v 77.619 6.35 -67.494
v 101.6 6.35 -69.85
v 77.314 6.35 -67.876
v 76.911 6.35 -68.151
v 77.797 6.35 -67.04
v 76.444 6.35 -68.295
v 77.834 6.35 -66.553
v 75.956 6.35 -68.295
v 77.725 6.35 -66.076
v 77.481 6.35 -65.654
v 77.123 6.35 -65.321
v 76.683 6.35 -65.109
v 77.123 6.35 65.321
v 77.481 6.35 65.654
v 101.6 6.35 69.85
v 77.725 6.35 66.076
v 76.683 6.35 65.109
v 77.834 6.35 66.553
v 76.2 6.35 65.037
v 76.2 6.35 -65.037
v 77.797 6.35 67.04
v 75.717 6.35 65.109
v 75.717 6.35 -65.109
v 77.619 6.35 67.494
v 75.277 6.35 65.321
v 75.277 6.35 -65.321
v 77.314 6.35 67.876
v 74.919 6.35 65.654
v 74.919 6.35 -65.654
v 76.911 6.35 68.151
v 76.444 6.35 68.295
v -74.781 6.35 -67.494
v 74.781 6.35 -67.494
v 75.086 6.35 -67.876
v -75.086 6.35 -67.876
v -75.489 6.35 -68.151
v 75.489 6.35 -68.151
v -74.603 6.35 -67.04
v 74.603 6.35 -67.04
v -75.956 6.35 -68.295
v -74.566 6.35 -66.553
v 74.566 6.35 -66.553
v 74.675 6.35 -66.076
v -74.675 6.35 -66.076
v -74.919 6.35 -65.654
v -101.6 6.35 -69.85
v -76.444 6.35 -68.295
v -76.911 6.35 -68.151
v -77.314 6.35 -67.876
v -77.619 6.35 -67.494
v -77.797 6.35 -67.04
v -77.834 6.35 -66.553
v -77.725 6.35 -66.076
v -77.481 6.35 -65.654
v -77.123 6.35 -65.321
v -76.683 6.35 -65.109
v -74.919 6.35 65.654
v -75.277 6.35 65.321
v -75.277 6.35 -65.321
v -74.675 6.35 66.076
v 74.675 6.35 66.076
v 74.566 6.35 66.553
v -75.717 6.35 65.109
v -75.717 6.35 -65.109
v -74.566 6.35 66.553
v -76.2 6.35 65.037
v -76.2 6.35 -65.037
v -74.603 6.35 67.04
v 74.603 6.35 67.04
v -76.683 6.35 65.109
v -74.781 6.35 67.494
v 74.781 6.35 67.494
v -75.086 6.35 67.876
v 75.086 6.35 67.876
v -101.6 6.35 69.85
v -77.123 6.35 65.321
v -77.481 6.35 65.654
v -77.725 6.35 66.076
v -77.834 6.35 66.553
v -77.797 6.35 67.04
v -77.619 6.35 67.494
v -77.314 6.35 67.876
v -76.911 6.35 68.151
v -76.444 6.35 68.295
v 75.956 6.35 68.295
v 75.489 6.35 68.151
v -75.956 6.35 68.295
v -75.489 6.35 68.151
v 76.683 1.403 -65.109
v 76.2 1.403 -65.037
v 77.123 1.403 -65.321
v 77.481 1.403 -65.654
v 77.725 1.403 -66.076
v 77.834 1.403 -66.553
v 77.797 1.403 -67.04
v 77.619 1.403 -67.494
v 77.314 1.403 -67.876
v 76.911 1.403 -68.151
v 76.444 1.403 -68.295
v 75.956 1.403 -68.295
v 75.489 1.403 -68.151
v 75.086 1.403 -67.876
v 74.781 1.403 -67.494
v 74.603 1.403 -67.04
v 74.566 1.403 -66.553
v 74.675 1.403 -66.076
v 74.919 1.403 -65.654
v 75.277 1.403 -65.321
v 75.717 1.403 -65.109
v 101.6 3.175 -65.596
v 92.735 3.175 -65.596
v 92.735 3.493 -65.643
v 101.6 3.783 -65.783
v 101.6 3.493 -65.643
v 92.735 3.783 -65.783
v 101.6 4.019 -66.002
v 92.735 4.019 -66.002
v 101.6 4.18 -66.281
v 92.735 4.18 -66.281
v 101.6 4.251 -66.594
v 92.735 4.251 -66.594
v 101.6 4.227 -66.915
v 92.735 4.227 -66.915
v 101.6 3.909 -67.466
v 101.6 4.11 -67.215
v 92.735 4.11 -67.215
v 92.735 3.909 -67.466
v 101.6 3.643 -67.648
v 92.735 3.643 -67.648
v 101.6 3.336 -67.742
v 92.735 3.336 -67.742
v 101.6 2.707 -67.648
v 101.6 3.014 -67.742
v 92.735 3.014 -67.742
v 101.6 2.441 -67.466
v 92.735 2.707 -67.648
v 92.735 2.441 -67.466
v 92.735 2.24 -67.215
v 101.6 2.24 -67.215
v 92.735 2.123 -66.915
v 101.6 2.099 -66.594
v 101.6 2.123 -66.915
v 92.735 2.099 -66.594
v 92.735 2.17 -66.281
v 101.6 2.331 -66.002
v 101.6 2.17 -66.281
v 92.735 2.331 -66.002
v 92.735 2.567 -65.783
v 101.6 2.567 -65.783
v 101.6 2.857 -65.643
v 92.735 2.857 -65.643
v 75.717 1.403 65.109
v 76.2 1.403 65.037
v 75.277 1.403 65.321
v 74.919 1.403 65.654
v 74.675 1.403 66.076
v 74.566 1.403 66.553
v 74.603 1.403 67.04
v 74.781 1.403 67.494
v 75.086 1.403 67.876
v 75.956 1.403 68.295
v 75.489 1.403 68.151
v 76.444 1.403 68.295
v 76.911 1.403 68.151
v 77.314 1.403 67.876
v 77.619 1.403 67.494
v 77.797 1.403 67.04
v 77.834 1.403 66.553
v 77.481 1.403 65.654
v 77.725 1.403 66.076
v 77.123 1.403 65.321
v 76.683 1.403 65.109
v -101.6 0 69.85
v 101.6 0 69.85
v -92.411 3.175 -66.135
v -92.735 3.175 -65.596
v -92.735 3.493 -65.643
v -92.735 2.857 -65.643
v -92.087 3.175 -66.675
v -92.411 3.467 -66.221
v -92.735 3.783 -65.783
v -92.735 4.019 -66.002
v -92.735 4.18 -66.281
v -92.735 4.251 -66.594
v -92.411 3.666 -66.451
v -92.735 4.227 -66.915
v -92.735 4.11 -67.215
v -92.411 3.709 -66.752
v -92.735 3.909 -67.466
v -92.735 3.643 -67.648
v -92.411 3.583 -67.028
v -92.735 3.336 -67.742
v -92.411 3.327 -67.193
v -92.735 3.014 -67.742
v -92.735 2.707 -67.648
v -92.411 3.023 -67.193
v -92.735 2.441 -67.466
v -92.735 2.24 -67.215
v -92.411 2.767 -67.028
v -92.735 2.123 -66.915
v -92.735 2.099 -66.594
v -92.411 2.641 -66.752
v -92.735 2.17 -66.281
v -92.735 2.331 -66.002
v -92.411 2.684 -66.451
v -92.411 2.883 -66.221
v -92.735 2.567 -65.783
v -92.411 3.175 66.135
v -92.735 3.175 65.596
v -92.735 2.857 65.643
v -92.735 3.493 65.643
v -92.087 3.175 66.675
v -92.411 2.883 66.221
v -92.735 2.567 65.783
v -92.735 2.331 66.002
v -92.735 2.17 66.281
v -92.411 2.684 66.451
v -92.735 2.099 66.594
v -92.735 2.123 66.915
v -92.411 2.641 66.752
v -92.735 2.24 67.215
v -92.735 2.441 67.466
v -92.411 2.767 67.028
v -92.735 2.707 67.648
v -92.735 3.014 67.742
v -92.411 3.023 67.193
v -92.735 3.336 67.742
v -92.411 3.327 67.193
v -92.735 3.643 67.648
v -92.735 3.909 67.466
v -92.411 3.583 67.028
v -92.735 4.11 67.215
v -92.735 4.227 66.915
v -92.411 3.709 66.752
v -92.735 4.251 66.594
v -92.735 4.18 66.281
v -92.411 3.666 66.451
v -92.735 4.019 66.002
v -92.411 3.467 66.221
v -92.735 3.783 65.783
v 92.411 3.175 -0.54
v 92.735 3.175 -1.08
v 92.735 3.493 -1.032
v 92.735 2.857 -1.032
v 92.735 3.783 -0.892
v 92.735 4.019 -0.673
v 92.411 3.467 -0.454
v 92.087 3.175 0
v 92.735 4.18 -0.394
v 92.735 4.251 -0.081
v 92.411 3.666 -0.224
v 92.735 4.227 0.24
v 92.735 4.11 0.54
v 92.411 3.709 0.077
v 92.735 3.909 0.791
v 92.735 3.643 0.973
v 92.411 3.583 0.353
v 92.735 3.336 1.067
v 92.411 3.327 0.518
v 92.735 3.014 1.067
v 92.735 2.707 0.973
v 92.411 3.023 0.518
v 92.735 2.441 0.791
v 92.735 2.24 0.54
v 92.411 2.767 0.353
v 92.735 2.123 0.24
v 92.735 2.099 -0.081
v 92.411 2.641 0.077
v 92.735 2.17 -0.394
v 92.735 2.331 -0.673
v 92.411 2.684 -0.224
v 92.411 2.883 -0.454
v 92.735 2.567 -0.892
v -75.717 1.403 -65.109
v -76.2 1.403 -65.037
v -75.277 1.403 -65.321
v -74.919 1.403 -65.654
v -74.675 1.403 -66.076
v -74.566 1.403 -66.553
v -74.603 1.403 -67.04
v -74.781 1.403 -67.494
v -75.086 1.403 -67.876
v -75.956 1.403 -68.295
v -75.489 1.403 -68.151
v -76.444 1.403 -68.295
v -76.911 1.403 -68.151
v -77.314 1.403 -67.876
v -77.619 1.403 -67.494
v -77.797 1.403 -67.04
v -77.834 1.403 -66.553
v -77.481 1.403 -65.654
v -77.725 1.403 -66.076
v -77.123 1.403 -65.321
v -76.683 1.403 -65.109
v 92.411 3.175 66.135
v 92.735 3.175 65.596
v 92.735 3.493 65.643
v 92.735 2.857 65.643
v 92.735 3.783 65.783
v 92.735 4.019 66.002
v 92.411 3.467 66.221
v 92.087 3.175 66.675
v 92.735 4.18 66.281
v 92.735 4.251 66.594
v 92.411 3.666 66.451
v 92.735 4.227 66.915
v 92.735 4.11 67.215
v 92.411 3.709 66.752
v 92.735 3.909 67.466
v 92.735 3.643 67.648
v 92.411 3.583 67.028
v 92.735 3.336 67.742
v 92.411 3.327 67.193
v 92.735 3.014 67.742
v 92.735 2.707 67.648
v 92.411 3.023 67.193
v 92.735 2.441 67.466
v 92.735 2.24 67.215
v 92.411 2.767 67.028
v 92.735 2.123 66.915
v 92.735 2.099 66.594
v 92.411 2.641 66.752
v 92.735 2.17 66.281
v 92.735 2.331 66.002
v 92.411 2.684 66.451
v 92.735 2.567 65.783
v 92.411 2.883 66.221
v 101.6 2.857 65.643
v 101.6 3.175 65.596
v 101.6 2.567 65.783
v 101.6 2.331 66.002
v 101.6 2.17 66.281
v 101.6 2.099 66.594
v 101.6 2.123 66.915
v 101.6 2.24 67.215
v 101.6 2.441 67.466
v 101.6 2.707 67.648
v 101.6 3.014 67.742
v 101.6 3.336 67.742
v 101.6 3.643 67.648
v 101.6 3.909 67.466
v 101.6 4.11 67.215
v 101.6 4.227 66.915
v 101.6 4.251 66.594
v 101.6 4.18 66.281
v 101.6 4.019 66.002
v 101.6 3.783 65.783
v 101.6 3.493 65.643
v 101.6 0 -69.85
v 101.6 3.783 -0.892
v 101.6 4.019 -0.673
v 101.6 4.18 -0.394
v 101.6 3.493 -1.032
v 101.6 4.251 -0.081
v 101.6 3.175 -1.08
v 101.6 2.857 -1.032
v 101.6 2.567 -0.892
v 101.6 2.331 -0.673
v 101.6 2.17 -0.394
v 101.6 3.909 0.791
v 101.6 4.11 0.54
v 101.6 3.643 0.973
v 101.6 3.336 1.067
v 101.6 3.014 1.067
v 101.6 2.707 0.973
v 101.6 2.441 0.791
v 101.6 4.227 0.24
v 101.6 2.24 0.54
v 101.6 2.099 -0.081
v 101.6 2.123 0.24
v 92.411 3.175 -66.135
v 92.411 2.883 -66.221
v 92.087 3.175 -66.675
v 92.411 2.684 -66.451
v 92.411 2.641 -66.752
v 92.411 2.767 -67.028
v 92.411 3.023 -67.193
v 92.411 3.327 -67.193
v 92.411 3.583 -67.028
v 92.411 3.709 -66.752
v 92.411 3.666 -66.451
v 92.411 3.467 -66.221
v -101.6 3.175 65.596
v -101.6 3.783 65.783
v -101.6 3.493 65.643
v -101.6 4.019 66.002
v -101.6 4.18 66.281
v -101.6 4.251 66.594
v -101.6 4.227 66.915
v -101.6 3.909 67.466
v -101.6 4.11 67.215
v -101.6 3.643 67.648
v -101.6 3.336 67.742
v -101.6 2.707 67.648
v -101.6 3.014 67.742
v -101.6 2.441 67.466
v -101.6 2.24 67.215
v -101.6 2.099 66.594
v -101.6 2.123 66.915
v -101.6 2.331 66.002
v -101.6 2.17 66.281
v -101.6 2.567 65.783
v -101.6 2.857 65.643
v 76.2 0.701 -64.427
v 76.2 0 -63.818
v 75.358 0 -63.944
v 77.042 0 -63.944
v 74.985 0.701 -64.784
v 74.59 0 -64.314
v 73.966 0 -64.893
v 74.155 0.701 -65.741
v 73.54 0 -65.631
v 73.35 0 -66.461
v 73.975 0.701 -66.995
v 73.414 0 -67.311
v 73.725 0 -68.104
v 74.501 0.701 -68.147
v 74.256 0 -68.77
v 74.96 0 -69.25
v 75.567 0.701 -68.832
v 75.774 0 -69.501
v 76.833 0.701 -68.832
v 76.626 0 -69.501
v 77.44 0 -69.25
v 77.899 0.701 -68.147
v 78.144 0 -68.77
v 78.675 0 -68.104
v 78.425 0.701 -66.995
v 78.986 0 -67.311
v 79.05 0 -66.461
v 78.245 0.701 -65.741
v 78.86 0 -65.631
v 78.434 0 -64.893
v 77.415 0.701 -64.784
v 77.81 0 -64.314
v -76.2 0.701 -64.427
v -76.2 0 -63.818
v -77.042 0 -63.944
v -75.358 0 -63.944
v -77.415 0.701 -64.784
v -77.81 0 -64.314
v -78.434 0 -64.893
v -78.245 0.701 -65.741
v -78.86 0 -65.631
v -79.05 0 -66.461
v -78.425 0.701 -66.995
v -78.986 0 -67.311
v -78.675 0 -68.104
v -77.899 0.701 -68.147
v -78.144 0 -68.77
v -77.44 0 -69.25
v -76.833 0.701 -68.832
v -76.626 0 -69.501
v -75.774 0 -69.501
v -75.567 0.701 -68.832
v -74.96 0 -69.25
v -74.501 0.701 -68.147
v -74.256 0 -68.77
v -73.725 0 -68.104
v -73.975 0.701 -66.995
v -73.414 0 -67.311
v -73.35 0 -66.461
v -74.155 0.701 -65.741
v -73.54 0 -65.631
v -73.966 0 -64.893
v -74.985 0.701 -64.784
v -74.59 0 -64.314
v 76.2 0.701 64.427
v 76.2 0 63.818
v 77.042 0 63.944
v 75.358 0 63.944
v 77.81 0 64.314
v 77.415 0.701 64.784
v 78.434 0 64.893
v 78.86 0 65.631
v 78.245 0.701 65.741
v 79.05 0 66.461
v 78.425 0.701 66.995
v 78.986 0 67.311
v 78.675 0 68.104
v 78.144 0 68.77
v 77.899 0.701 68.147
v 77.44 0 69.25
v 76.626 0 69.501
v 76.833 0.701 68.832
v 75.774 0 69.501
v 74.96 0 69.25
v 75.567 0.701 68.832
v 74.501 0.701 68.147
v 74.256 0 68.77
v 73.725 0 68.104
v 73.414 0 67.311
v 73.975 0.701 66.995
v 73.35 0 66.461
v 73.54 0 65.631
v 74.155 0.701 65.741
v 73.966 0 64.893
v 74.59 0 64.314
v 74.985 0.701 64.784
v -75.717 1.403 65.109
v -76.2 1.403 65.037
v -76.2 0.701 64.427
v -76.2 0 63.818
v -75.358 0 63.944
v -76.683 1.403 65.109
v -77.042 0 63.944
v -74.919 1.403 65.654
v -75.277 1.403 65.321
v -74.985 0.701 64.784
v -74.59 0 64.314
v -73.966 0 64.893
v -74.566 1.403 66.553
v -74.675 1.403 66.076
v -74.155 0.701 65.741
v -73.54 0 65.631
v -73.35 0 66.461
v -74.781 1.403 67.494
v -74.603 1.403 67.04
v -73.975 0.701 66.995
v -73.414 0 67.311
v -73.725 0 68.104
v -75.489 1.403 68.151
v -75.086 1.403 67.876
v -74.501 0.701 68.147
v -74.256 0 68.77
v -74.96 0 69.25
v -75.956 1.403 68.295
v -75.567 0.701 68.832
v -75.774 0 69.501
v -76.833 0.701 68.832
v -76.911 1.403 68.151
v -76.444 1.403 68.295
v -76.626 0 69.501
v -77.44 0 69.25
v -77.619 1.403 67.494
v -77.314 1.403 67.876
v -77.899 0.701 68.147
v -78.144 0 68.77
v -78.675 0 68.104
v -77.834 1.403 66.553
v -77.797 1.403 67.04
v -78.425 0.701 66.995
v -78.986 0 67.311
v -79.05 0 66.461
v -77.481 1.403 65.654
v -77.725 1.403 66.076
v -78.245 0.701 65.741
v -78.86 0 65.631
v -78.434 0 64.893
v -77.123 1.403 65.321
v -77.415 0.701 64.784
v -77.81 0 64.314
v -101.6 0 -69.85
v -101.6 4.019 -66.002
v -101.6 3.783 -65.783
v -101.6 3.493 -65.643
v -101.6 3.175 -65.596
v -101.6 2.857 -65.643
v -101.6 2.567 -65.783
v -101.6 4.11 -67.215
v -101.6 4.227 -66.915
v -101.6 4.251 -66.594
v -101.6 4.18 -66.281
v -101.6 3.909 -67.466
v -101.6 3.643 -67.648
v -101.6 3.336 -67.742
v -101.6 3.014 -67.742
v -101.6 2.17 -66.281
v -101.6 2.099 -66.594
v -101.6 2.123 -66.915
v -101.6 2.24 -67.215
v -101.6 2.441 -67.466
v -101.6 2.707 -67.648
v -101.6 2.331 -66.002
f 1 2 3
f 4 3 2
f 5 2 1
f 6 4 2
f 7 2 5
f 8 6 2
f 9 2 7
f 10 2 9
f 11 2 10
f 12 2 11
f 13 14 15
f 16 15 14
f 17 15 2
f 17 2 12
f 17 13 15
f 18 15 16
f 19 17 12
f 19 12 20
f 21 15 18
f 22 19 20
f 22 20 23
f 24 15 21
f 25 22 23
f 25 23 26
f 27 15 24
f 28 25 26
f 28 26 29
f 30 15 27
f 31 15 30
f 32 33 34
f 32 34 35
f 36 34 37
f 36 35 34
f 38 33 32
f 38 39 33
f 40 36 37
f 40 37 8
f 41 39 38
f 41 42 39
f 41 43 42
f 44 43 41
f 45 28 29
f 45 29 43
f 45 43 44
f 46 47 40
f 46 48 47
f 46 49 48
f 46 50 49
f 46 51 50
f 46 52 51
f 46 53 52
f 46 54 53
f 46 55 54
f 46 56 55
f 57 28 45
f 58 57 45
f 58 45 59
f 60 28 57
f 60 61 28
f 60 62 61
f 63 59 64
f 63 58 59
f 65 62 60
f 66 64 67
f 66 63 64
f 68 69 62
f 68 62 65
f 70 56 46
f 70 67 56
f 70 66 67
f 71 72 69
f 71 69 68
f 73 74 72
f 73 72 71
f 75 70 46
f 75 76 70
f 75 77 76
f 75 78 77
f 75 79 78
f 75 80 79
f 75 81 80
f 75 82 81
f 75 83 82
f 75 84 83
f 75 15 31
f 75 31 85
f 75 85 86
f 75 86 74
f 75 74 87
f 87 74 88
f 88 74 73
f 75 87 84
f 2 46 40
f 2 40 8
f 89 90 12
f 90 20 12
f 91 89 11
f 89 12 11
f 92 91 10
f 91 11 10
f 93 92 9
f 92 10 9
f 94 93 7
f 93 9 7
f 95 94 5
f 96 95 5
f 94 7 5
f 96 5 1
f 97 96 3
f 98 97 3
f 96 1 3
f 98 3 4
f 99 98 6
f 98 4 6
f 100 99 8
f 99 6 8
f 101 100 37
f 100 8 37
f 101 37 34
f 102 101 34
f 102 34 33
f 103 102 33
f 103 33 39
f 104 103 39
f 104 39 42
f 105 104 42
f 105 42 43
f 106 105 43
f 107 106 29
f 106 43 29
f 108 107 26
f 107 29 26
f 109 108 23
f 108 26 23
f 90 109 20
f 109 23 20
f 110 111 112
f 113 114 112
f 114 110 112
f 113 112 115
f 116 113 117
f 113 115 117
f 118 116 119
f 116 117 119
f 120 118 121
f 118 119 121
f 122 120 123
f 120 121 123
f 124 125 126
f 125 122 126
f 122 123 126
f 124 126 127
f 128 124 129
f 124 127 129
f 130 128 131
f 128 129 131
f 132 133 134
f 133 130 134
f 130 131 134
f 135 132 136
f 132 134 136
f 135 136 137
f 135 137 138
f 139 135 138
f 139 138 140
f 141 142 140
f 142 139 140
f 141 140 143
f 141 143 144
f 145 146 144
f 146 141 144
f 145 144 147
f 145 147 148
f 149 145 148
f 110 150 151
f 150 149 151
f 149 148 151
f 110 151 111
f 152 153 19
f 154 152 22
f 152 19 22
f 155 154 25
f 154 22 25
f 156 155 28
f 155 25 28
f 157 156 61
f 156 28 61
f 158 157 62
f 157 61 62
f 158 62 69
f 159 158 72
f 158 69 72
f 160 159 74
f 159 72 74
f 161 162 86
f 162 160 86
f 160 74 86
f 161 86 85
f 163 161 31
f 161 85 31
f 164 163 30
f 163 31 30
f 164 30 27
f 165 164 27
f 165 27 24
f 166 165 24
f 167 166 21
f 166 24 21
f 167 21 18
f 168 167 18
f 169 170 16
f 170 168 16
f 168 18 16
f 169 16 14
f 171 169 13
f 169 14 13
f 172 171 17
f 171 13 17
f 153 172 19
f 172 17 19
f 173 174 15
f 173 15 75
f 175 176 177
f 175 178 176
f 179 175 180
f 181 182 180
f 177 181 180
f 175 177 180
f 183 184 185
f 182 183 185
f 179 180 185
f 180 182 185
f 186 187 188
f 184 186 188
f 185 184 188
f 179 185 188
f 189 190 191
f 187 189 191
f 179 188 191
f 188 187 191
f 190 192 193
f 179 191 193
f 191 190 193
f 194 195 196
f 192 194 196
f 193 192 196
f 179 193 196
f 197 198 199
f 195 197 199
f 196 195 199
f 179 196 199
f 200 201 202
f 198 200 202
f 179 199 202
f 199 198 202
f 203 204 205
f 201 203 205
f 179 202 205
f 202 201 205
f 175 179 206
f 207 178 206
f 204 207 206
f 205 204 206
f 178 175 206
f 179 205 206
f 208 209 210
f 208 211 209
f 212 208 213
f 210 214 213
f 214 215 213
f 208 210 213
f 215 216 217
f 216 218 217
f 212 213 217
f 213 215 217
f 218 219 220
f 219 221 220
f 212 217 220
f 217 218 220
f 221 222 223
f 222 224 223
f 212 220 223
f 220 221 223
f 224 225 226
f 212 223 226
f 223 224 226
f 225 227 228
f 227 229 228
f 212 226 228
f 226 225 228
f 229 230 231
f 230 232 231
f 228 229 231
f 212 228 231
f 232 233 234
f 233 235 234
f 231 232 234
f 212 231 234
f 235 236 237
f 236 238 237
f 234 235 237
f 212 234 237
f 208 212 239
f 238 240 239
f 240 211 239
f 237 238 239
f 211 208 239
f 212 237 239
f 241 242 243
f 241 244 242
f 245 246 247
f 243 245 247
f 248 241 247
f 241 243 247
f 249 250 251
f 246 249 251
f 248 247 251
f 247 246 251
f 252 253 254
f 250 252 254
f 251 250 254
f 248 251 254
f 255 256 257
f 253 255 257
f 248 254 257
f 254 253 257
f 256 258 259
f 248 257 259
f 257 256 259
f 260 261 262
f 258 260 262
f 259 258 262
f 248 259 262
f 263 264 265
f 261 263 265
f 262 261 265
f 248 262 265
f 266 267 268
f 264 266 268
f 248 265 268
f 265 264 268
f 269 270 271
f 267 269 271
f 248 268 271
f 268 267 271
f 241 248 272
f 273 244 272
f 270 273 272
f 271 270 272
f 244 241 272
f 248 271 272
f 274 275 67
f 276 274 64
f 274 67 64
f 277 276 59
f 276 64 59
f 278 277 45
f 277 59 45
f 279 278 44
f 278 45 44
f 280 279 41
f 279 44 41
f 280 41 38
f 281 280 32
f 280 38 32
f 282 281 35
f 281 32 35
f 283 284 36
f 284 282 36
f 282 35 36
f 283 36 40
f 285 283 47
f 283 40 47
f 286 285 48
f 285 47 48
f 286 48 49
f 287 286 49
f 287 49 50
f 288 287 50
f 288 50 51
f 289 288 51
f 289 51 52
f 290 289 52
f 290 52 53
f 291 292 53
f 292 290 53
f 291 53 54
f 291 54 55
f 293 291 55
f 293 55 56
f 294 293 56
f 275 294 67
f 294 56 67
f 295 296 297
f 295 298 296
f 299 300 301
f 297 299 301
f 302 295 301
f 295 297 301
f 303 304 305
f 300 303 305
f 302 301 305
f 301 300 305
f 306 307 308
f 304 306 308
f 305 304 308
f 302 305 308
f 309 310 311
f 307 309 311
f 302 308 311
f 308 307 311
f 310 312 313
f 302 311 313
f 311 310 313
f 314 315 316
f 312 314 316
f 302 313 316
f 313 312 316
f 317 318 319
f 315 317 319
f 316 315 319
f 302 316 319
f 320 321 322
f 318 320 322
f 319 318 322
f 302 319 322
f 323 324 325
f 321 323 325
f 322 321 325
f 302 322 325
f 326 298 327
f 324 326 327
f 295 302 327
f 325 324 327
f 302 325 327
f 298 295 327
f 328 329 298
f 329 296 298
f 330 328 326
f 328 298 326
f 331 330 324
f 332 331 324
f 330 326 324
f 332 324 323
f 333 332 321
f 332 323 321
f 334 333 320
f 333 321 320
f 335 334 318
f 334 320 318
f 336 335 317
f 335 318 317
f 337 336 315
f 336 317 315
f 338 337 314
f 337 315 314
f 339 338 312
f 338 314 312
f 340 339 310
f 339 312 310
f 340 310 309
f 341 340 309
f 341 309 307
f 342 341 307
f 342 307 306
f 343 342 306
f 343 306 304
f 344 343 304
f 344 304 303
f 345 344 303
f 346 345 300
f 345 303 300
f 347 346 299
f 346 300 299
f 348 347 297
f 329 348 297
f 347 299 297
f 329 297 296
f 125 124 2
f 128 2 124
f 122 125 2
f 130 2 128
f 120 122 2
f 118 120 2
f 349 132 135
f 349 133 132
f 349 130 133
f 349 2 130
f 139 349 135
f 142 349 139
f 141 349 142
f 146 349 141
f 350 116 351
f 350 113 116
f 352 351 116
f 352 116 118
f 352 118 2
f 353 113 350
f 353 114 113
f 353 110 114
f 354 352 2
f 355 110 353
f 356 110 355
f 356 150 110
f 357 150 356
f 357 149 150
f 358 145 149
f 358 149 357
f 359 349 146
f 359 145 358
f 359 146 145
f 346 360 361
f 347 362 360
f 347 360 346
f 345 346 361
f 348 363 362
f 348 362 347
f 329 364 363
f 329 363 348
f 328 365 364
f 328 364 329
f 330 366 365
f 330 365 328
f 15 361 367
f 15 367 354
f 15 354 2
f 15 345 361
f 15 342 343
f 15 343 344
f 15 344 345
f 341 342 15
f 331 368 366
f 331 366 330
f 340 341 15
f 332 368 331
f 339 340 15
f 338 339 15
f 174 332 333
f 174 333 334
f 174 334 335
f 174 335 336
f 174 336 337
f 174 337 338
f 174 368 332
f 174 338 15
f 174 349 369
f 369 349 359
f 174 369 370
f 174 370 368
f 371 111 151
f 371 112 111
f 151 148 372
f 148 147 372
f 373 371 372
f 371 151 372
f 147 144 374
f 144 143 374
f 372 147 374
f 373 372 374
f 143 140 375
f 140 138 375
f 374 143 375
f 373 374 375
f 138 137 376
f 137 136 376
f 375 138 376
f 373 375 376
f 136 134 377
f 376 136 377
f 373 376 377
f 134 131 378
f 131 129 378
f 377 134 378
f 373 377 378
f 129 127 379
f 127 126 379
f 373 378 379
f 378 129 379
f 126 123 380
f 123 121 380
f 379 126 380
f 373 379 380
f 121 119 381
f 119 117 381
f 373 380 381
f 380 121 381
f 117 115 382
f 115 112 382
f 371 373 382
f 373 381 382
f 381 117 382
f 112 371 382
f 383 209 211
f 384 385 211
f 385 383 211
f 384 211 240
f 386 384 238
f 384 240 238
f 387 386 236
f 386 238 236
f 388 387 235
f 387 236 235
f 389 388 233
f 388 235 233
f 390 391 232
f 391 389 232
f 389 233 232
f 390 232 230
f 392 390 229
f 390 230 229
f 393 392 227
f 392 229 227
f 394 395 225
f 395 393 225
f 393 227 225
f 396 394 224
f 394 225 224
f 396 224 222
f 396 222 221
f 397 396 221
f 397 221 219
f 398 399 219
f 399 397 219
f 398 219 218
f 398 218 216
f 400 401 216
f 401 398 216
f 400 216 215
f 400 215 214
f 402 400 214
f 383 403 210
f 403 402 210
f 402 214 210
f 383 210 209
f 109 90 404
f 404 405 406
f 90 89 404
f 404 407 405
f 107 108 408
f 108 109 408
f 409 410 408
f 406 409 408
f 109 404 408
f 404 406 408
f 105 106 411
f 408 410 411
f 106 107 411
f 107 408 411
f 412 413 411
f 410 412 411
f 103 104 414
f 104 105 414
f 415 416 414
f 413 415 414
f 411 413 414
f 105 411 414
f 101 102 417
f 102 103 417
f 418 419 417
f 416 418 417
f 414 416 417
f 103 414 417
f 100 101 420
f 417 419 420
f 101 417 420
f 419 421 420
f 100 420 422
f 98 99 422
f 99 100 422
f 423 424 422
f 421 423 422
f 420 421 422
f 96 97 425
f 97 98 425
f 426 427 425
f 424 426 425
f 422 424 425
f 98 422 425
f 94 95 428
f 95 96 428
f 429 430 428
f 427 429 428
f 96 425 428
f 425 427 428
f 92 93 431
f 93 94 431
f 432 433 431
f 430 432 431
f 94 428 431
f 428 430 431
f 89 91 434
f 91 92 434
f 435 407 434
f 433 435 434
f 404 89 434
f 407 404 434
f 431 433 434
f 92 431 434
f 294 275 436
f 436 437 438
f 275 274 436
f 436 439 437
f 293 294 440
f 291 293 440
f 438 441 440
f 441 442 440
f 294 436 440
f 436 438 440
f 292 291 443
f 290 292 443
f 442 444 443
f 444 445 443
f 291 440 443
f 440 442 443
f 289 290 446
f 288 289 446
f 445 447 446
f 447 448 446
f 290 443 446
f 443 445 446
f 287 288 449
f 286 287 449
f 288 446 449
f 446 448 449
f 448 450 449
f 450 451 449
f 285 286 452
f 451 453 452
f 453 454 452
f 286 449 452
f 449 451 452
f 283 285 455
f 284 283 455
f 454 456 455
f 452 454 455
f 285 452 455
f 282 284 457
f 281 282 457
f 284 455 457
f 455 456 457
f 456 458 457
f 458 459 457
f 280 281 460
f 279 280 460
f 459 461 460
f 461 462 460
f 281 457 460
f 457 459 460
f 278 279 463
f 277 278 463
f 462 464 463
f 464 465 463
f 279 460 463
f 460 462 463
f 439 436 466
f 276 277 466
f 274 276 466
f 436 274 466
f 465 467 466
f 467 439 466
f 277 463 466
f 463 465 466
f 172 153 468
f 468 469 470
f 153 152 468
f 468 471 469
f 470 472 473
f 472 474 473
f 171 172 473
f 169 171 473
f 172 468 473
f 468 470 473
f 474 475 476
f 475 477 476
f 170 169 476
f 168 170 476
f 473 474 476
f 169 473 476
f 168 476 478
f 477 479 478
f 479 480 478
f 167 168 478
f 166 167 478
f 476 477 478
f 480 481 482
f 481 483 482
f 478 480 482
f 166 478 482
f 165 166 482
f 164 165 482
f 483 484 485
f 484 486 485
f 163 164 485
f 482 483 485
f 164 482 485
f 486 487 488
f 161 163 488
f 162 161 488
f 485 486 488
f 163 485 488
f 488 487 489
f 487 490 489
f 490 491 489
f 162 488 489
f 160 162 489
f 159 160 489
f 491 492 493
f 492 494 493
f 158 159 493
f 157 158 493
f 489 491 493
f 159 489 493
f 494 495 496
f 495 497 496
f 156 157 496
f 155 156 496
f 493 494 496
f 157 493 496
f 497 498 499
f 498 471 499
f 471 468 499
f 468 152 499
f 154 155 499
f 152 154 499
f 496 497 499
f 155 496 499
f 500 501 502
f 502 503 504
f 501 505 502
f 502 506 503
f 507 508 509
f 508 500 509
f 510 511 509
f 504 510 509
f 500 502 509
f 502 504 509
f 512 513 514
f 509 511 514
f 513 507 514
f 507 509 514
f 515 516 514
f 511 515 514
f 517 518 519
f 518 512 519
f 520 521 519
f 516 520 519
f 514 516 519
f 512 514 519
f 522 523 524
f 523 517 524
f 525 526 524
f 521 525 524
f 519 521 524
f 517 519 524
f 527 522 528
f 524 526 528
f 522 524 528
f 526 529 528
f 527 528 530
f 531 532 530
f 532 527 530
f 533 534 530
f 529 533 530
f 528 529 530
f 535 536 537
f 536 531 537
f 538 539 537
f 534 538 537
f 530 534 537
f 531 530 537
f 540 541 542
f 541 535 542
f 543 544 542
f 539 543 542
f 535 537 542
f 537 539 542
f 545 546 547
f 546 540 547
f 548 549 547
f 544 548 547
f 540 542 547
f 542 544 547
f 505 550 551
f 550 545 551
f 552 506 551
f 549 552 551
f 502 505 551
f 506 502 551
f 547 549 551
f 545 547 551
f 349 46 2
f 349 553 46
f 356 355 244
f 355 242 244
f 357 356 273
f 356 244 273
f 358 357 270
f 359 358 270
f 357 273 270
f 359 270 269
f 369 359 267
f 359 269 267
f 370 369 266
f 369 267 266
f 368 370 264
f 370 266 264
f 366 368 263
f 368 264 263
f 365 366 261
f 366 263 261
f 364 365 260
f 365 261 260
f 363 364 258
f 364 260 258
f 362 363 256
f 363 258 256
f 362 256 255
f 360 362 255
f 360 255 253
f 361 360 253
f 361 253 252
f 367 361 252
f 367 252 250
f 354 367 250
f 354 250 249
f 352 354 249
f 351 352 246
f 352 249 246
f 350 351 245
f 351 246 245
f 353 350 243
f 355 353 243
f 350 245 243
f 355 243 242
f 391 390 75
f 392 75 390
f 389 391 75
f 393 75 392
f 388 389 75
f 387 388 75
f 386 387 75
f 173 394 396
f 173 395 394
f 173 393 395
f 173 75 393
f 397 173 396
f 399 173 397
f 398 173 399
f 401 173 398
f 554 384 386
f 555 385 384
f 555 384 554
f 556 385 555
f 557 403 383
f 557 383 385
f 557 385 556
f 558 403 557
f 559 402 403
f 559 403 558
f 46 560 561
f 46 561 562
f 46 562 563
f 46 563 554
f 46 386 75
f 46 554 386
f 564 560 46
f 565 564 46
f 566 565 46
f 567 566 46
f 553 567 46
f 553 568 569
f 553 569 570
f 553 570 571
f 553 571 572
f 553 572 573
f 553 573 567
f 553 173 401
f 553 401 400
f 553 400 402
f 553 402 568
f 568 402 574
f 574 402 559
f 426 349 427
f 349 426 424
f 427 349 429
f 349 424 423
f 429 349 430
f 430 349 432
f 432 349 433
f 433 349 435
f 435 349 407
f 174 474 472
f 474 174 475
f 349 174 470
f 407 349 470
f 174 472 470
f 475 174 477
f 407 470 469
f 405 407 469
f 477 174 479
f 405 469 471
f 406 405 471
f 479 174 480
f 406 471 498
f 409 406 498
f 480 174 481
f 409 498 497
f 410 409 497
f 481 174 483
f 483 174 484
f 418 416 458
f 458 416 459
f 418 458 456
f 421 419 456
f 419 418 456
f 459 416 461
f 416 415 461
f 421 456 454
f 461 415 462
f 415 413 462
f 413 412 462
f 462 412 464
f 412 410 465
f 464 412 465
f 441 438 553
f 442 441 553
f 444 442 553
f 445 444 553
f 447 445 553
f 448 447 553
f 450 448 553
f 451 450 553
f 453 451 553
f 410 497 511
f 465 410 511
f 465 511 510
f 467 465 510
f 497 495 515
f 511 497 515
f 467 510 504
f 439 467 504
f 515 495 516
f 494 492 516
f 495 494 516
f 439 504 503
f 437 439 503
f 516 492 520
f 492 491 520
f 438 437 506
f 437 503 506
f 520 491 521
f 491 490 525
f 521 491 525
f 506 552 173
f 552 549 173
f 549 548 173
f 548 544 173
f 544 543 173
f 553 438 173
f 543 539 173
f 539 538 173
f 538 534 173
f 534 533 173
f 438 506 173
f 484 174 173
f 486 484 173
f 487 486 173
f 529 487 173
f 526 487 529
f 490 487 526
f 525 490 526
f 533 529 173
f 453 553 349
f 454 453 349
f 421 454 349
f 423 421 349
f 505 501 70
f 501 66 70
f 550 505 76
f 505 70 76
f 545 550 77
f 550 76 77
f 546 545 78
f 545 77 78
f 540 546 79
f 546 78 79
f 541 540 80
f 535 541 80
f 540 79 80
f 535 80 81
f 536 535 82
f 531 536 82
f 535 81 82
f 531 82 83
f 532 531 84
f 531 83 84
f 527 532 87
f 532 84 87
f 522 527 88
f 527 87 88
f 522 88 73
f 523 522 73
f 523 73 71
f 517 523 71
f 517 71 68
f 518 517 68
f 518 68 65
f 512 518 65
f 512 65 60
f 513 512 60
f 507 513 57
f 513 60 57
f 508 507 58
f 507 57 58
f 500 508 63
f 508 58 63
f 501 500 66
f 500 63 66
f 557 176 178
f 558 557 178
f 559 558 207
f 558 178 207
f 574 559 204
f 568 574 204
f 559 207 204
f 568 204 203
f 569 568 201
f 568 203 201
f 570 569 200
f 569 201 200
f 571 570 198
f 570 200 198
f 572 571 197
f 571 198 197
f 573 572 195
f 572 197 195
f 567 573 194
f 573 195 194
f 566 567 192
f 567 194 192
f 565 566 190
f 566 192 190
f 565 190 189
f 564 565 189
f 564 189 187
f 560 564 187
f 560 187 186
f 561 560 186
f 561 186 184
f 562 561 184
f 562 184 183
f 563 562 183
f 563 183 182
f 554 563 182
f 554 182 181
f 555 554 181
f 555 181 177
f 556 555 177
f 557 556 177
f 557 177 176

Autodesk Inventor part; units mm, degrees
ref_plane "YZ Plane" through (0, 0, 0) normal (1, 0, 0) x (0, 1, 0)
ref_plane "XZ Plane" through (0, 0, 0) normal (0, 1, 0) x (-1, 0, 0)
ref_plane "XY Plane" through (0, 0, 0) normal (0, 0, 1) x (1, 0, 0)
sketch "Sketch1" plane through (0, 0, 0) normal (0, 1, 0) x (-1, 0, 0)
  line L0 (-101.6, 69.85) -> (101.6, 69.85)
  line L1 (101.6, 69.85) -> (101.6, -69.85)
  line L2 (101.6, -69.85) -> (-101.6, -69.85)
  line L3 (-101.6, -69.85) -> (-101.6, 69.85)
  line L4 (-101.6, 69.85) -> (101.6, -69.85) construction
  line L5 (101.6, 69.85) -> (-101.6, -69.85) construction
  point P0 (0, 0)
  dimension "d0" = 203.2
  dimension "d1" = 139.7
extrude "Extrusion1" add sketch "Sketch1" along normal blind 6.35
sketch "Sketch9" plane through (101.6, 0, 69.85) normal (1, 0, 0) x (0, 0, -1)
  line L0 (139.7, 0) -> (0, 0) projected
  line L1 (139.7, 0) -> (139.7, 6.35) projected
  line L2 (0, 6.35) -> (139.7, 6.35) projected
  line L3 (0, 0) -> (0, 6.35) projected
  point P0 (69.85, 0)
  point P1 (3.175, 3.175)
  dimension "d45" = 3.175
  dimension "d46" = 3.175
hole "Hole3" at (101.6, 3.175, 66.675) direction (-1, 0, 0) diameter 2.159 depth 8.8646 tip angle 118
mirror "Mirror5" about plane through (0, 0, 0) normal (0, 0, 1) of "Hole3"
mirror "Mirror6" about plane through (0, 0, 0) normal (1, 0, 0) of "Hole3", "Mirror5"
sketch "Sketch11" plane through (0, 0, 0) normal (0, -1, 0) x (1, 0, 0)
  line L0 (101.6, 69.85) -> (-101.6, 69.85) projected
  line L1 (-101.6, 69.85) -> (-101.6, -69.85) projected
  line L2 (-101.6, -69.85) -> (101.6, -69.85) projected
  line L3 (101.6, -69.85) -> (101.6, 69.85) projected
  point P0 (0, 0)
  point P1 (-76.2, 66.675)
  dimension "d61" = 25.4
  dimension "d62" = 3.175
hole "Hole4" at (-76.2, 0, 66.675) direction (0, 1, 0) diameter 3.2766 end through all countersink diameter 5.715 countersink angle 82 clearance for "Flat Head Machine Screw (82)" size "#4" standard "Ansi Unified Screw Threads"
mirror "Mirror7" about plane through (0, 0, 0) normal (1, 0, 0) of "Hole4"
mirror "Mirror8" about plane through (0, 0, 0) normal (0, 0, 1) of "Hole4", "Mirror7"
sketch "Sketch12" plane through (101.6, 0, 69.85) normal (1, 0, 0) x (0, 0, -1)
  circle A0 centre (136.525, 3.175) radius 1.0795 projected
  circle A1 centre (3.175, 3.175) radius 1.0795 projected
  line L0 (139.7, 0) -> (0, 0) projected
  line L1 (139.7, 0) -> (139.7, 6.35) projected
  line L2 (0, 6.35) -> (139.7, 6.35) projected
  line L3 (0, 0) -> (0, 6.35) projected
  point P0 (69.85, 0)
  point P1 (69.85, 3.175)
  dimension "d70" = 3.175
  dimension "d71" = 69.85
hole "Hole5" at (101.6, 3.175, 0) direction (-1, 0, 0) diameter 2.159 depth 8.8646 tip angle 118
equation "\"d0\" = depth"
equation "\"d1\" = height + 2 * plasticThickness"
equation "\"d2\" = caseThickness"
equation "\"d45\" = 0.5 * caseThickness"
equation "\"d46\" = 0.5 * caseThickness"
equation "\"d61\" = 4 * caseThickness"
equation "\"d62\" = 0.5 * caseThickness"
equation "\"d70\" = 0.5 * caseThickness"
equation "\"d71\" = 0.5 * height + caseThickness"
equation "\"acrylicThickness\" = 9.525"
equation "\"depth\" = 203.2"
equation "\"height\" = 127"
equation "\"fresnelThickness\" = 0.254"
equation "\"focalLength\" = 152.4"
equation "\"centerThickness\" = 1.27"
equation "\"sensorHolderDepth\" = 19.05"
equation "\"internalAcrylicThickness\" = 6.35"
equation "\"frameAcrylicThickness\" = 9.525"
equation "\"width\" = 127"
equation "\"mirrorAngle\" = 2.5deg"
equation "\"detectorWidth\" = 52"
equation "\"detectorHeight\" = 52"
equation "\"mirrorThickness\" = 3.175"
equation "\"ior\" = 1.49"
equation "\"fresnelAngle\" = 90deg"
equation "\"fresnelEffectiveDiameter\" = 152.4"
equation "\"oRingWidth\" = 1.5875"
equation "\"aerogelClearence\" = 3.175"
equation "\"backplaneHoleOffsett\" = 6.35"
equation "\"backplanePCBHeight\" = 76.2"
equation "\"backplanePCBWidth\" = 76.2"
equation "\"backplanePostionOffsett\" = 12.7"
equation "\"moduleSlotClearence\" = 0.79375"
equation "\"plasticThickness\" = 6.35"
equation "\"aerogelHolderDepth\" = 49.022"
equation "\"caseThickness\" = 6.35"
equation "\"alignmantGrooveDepth\" = 1.5875"
equation "\"alignmentGrooveDepth\" = 1.5875"
equation "\"alignmentGrooveClearance\" = 0.1016"
equation "\"frontPanelThickness\" = 1.5875"
equation "\"fresnelGrooveWidth\" = 1.778"
properties part number "leftSide" material "Aluminum 6061"
